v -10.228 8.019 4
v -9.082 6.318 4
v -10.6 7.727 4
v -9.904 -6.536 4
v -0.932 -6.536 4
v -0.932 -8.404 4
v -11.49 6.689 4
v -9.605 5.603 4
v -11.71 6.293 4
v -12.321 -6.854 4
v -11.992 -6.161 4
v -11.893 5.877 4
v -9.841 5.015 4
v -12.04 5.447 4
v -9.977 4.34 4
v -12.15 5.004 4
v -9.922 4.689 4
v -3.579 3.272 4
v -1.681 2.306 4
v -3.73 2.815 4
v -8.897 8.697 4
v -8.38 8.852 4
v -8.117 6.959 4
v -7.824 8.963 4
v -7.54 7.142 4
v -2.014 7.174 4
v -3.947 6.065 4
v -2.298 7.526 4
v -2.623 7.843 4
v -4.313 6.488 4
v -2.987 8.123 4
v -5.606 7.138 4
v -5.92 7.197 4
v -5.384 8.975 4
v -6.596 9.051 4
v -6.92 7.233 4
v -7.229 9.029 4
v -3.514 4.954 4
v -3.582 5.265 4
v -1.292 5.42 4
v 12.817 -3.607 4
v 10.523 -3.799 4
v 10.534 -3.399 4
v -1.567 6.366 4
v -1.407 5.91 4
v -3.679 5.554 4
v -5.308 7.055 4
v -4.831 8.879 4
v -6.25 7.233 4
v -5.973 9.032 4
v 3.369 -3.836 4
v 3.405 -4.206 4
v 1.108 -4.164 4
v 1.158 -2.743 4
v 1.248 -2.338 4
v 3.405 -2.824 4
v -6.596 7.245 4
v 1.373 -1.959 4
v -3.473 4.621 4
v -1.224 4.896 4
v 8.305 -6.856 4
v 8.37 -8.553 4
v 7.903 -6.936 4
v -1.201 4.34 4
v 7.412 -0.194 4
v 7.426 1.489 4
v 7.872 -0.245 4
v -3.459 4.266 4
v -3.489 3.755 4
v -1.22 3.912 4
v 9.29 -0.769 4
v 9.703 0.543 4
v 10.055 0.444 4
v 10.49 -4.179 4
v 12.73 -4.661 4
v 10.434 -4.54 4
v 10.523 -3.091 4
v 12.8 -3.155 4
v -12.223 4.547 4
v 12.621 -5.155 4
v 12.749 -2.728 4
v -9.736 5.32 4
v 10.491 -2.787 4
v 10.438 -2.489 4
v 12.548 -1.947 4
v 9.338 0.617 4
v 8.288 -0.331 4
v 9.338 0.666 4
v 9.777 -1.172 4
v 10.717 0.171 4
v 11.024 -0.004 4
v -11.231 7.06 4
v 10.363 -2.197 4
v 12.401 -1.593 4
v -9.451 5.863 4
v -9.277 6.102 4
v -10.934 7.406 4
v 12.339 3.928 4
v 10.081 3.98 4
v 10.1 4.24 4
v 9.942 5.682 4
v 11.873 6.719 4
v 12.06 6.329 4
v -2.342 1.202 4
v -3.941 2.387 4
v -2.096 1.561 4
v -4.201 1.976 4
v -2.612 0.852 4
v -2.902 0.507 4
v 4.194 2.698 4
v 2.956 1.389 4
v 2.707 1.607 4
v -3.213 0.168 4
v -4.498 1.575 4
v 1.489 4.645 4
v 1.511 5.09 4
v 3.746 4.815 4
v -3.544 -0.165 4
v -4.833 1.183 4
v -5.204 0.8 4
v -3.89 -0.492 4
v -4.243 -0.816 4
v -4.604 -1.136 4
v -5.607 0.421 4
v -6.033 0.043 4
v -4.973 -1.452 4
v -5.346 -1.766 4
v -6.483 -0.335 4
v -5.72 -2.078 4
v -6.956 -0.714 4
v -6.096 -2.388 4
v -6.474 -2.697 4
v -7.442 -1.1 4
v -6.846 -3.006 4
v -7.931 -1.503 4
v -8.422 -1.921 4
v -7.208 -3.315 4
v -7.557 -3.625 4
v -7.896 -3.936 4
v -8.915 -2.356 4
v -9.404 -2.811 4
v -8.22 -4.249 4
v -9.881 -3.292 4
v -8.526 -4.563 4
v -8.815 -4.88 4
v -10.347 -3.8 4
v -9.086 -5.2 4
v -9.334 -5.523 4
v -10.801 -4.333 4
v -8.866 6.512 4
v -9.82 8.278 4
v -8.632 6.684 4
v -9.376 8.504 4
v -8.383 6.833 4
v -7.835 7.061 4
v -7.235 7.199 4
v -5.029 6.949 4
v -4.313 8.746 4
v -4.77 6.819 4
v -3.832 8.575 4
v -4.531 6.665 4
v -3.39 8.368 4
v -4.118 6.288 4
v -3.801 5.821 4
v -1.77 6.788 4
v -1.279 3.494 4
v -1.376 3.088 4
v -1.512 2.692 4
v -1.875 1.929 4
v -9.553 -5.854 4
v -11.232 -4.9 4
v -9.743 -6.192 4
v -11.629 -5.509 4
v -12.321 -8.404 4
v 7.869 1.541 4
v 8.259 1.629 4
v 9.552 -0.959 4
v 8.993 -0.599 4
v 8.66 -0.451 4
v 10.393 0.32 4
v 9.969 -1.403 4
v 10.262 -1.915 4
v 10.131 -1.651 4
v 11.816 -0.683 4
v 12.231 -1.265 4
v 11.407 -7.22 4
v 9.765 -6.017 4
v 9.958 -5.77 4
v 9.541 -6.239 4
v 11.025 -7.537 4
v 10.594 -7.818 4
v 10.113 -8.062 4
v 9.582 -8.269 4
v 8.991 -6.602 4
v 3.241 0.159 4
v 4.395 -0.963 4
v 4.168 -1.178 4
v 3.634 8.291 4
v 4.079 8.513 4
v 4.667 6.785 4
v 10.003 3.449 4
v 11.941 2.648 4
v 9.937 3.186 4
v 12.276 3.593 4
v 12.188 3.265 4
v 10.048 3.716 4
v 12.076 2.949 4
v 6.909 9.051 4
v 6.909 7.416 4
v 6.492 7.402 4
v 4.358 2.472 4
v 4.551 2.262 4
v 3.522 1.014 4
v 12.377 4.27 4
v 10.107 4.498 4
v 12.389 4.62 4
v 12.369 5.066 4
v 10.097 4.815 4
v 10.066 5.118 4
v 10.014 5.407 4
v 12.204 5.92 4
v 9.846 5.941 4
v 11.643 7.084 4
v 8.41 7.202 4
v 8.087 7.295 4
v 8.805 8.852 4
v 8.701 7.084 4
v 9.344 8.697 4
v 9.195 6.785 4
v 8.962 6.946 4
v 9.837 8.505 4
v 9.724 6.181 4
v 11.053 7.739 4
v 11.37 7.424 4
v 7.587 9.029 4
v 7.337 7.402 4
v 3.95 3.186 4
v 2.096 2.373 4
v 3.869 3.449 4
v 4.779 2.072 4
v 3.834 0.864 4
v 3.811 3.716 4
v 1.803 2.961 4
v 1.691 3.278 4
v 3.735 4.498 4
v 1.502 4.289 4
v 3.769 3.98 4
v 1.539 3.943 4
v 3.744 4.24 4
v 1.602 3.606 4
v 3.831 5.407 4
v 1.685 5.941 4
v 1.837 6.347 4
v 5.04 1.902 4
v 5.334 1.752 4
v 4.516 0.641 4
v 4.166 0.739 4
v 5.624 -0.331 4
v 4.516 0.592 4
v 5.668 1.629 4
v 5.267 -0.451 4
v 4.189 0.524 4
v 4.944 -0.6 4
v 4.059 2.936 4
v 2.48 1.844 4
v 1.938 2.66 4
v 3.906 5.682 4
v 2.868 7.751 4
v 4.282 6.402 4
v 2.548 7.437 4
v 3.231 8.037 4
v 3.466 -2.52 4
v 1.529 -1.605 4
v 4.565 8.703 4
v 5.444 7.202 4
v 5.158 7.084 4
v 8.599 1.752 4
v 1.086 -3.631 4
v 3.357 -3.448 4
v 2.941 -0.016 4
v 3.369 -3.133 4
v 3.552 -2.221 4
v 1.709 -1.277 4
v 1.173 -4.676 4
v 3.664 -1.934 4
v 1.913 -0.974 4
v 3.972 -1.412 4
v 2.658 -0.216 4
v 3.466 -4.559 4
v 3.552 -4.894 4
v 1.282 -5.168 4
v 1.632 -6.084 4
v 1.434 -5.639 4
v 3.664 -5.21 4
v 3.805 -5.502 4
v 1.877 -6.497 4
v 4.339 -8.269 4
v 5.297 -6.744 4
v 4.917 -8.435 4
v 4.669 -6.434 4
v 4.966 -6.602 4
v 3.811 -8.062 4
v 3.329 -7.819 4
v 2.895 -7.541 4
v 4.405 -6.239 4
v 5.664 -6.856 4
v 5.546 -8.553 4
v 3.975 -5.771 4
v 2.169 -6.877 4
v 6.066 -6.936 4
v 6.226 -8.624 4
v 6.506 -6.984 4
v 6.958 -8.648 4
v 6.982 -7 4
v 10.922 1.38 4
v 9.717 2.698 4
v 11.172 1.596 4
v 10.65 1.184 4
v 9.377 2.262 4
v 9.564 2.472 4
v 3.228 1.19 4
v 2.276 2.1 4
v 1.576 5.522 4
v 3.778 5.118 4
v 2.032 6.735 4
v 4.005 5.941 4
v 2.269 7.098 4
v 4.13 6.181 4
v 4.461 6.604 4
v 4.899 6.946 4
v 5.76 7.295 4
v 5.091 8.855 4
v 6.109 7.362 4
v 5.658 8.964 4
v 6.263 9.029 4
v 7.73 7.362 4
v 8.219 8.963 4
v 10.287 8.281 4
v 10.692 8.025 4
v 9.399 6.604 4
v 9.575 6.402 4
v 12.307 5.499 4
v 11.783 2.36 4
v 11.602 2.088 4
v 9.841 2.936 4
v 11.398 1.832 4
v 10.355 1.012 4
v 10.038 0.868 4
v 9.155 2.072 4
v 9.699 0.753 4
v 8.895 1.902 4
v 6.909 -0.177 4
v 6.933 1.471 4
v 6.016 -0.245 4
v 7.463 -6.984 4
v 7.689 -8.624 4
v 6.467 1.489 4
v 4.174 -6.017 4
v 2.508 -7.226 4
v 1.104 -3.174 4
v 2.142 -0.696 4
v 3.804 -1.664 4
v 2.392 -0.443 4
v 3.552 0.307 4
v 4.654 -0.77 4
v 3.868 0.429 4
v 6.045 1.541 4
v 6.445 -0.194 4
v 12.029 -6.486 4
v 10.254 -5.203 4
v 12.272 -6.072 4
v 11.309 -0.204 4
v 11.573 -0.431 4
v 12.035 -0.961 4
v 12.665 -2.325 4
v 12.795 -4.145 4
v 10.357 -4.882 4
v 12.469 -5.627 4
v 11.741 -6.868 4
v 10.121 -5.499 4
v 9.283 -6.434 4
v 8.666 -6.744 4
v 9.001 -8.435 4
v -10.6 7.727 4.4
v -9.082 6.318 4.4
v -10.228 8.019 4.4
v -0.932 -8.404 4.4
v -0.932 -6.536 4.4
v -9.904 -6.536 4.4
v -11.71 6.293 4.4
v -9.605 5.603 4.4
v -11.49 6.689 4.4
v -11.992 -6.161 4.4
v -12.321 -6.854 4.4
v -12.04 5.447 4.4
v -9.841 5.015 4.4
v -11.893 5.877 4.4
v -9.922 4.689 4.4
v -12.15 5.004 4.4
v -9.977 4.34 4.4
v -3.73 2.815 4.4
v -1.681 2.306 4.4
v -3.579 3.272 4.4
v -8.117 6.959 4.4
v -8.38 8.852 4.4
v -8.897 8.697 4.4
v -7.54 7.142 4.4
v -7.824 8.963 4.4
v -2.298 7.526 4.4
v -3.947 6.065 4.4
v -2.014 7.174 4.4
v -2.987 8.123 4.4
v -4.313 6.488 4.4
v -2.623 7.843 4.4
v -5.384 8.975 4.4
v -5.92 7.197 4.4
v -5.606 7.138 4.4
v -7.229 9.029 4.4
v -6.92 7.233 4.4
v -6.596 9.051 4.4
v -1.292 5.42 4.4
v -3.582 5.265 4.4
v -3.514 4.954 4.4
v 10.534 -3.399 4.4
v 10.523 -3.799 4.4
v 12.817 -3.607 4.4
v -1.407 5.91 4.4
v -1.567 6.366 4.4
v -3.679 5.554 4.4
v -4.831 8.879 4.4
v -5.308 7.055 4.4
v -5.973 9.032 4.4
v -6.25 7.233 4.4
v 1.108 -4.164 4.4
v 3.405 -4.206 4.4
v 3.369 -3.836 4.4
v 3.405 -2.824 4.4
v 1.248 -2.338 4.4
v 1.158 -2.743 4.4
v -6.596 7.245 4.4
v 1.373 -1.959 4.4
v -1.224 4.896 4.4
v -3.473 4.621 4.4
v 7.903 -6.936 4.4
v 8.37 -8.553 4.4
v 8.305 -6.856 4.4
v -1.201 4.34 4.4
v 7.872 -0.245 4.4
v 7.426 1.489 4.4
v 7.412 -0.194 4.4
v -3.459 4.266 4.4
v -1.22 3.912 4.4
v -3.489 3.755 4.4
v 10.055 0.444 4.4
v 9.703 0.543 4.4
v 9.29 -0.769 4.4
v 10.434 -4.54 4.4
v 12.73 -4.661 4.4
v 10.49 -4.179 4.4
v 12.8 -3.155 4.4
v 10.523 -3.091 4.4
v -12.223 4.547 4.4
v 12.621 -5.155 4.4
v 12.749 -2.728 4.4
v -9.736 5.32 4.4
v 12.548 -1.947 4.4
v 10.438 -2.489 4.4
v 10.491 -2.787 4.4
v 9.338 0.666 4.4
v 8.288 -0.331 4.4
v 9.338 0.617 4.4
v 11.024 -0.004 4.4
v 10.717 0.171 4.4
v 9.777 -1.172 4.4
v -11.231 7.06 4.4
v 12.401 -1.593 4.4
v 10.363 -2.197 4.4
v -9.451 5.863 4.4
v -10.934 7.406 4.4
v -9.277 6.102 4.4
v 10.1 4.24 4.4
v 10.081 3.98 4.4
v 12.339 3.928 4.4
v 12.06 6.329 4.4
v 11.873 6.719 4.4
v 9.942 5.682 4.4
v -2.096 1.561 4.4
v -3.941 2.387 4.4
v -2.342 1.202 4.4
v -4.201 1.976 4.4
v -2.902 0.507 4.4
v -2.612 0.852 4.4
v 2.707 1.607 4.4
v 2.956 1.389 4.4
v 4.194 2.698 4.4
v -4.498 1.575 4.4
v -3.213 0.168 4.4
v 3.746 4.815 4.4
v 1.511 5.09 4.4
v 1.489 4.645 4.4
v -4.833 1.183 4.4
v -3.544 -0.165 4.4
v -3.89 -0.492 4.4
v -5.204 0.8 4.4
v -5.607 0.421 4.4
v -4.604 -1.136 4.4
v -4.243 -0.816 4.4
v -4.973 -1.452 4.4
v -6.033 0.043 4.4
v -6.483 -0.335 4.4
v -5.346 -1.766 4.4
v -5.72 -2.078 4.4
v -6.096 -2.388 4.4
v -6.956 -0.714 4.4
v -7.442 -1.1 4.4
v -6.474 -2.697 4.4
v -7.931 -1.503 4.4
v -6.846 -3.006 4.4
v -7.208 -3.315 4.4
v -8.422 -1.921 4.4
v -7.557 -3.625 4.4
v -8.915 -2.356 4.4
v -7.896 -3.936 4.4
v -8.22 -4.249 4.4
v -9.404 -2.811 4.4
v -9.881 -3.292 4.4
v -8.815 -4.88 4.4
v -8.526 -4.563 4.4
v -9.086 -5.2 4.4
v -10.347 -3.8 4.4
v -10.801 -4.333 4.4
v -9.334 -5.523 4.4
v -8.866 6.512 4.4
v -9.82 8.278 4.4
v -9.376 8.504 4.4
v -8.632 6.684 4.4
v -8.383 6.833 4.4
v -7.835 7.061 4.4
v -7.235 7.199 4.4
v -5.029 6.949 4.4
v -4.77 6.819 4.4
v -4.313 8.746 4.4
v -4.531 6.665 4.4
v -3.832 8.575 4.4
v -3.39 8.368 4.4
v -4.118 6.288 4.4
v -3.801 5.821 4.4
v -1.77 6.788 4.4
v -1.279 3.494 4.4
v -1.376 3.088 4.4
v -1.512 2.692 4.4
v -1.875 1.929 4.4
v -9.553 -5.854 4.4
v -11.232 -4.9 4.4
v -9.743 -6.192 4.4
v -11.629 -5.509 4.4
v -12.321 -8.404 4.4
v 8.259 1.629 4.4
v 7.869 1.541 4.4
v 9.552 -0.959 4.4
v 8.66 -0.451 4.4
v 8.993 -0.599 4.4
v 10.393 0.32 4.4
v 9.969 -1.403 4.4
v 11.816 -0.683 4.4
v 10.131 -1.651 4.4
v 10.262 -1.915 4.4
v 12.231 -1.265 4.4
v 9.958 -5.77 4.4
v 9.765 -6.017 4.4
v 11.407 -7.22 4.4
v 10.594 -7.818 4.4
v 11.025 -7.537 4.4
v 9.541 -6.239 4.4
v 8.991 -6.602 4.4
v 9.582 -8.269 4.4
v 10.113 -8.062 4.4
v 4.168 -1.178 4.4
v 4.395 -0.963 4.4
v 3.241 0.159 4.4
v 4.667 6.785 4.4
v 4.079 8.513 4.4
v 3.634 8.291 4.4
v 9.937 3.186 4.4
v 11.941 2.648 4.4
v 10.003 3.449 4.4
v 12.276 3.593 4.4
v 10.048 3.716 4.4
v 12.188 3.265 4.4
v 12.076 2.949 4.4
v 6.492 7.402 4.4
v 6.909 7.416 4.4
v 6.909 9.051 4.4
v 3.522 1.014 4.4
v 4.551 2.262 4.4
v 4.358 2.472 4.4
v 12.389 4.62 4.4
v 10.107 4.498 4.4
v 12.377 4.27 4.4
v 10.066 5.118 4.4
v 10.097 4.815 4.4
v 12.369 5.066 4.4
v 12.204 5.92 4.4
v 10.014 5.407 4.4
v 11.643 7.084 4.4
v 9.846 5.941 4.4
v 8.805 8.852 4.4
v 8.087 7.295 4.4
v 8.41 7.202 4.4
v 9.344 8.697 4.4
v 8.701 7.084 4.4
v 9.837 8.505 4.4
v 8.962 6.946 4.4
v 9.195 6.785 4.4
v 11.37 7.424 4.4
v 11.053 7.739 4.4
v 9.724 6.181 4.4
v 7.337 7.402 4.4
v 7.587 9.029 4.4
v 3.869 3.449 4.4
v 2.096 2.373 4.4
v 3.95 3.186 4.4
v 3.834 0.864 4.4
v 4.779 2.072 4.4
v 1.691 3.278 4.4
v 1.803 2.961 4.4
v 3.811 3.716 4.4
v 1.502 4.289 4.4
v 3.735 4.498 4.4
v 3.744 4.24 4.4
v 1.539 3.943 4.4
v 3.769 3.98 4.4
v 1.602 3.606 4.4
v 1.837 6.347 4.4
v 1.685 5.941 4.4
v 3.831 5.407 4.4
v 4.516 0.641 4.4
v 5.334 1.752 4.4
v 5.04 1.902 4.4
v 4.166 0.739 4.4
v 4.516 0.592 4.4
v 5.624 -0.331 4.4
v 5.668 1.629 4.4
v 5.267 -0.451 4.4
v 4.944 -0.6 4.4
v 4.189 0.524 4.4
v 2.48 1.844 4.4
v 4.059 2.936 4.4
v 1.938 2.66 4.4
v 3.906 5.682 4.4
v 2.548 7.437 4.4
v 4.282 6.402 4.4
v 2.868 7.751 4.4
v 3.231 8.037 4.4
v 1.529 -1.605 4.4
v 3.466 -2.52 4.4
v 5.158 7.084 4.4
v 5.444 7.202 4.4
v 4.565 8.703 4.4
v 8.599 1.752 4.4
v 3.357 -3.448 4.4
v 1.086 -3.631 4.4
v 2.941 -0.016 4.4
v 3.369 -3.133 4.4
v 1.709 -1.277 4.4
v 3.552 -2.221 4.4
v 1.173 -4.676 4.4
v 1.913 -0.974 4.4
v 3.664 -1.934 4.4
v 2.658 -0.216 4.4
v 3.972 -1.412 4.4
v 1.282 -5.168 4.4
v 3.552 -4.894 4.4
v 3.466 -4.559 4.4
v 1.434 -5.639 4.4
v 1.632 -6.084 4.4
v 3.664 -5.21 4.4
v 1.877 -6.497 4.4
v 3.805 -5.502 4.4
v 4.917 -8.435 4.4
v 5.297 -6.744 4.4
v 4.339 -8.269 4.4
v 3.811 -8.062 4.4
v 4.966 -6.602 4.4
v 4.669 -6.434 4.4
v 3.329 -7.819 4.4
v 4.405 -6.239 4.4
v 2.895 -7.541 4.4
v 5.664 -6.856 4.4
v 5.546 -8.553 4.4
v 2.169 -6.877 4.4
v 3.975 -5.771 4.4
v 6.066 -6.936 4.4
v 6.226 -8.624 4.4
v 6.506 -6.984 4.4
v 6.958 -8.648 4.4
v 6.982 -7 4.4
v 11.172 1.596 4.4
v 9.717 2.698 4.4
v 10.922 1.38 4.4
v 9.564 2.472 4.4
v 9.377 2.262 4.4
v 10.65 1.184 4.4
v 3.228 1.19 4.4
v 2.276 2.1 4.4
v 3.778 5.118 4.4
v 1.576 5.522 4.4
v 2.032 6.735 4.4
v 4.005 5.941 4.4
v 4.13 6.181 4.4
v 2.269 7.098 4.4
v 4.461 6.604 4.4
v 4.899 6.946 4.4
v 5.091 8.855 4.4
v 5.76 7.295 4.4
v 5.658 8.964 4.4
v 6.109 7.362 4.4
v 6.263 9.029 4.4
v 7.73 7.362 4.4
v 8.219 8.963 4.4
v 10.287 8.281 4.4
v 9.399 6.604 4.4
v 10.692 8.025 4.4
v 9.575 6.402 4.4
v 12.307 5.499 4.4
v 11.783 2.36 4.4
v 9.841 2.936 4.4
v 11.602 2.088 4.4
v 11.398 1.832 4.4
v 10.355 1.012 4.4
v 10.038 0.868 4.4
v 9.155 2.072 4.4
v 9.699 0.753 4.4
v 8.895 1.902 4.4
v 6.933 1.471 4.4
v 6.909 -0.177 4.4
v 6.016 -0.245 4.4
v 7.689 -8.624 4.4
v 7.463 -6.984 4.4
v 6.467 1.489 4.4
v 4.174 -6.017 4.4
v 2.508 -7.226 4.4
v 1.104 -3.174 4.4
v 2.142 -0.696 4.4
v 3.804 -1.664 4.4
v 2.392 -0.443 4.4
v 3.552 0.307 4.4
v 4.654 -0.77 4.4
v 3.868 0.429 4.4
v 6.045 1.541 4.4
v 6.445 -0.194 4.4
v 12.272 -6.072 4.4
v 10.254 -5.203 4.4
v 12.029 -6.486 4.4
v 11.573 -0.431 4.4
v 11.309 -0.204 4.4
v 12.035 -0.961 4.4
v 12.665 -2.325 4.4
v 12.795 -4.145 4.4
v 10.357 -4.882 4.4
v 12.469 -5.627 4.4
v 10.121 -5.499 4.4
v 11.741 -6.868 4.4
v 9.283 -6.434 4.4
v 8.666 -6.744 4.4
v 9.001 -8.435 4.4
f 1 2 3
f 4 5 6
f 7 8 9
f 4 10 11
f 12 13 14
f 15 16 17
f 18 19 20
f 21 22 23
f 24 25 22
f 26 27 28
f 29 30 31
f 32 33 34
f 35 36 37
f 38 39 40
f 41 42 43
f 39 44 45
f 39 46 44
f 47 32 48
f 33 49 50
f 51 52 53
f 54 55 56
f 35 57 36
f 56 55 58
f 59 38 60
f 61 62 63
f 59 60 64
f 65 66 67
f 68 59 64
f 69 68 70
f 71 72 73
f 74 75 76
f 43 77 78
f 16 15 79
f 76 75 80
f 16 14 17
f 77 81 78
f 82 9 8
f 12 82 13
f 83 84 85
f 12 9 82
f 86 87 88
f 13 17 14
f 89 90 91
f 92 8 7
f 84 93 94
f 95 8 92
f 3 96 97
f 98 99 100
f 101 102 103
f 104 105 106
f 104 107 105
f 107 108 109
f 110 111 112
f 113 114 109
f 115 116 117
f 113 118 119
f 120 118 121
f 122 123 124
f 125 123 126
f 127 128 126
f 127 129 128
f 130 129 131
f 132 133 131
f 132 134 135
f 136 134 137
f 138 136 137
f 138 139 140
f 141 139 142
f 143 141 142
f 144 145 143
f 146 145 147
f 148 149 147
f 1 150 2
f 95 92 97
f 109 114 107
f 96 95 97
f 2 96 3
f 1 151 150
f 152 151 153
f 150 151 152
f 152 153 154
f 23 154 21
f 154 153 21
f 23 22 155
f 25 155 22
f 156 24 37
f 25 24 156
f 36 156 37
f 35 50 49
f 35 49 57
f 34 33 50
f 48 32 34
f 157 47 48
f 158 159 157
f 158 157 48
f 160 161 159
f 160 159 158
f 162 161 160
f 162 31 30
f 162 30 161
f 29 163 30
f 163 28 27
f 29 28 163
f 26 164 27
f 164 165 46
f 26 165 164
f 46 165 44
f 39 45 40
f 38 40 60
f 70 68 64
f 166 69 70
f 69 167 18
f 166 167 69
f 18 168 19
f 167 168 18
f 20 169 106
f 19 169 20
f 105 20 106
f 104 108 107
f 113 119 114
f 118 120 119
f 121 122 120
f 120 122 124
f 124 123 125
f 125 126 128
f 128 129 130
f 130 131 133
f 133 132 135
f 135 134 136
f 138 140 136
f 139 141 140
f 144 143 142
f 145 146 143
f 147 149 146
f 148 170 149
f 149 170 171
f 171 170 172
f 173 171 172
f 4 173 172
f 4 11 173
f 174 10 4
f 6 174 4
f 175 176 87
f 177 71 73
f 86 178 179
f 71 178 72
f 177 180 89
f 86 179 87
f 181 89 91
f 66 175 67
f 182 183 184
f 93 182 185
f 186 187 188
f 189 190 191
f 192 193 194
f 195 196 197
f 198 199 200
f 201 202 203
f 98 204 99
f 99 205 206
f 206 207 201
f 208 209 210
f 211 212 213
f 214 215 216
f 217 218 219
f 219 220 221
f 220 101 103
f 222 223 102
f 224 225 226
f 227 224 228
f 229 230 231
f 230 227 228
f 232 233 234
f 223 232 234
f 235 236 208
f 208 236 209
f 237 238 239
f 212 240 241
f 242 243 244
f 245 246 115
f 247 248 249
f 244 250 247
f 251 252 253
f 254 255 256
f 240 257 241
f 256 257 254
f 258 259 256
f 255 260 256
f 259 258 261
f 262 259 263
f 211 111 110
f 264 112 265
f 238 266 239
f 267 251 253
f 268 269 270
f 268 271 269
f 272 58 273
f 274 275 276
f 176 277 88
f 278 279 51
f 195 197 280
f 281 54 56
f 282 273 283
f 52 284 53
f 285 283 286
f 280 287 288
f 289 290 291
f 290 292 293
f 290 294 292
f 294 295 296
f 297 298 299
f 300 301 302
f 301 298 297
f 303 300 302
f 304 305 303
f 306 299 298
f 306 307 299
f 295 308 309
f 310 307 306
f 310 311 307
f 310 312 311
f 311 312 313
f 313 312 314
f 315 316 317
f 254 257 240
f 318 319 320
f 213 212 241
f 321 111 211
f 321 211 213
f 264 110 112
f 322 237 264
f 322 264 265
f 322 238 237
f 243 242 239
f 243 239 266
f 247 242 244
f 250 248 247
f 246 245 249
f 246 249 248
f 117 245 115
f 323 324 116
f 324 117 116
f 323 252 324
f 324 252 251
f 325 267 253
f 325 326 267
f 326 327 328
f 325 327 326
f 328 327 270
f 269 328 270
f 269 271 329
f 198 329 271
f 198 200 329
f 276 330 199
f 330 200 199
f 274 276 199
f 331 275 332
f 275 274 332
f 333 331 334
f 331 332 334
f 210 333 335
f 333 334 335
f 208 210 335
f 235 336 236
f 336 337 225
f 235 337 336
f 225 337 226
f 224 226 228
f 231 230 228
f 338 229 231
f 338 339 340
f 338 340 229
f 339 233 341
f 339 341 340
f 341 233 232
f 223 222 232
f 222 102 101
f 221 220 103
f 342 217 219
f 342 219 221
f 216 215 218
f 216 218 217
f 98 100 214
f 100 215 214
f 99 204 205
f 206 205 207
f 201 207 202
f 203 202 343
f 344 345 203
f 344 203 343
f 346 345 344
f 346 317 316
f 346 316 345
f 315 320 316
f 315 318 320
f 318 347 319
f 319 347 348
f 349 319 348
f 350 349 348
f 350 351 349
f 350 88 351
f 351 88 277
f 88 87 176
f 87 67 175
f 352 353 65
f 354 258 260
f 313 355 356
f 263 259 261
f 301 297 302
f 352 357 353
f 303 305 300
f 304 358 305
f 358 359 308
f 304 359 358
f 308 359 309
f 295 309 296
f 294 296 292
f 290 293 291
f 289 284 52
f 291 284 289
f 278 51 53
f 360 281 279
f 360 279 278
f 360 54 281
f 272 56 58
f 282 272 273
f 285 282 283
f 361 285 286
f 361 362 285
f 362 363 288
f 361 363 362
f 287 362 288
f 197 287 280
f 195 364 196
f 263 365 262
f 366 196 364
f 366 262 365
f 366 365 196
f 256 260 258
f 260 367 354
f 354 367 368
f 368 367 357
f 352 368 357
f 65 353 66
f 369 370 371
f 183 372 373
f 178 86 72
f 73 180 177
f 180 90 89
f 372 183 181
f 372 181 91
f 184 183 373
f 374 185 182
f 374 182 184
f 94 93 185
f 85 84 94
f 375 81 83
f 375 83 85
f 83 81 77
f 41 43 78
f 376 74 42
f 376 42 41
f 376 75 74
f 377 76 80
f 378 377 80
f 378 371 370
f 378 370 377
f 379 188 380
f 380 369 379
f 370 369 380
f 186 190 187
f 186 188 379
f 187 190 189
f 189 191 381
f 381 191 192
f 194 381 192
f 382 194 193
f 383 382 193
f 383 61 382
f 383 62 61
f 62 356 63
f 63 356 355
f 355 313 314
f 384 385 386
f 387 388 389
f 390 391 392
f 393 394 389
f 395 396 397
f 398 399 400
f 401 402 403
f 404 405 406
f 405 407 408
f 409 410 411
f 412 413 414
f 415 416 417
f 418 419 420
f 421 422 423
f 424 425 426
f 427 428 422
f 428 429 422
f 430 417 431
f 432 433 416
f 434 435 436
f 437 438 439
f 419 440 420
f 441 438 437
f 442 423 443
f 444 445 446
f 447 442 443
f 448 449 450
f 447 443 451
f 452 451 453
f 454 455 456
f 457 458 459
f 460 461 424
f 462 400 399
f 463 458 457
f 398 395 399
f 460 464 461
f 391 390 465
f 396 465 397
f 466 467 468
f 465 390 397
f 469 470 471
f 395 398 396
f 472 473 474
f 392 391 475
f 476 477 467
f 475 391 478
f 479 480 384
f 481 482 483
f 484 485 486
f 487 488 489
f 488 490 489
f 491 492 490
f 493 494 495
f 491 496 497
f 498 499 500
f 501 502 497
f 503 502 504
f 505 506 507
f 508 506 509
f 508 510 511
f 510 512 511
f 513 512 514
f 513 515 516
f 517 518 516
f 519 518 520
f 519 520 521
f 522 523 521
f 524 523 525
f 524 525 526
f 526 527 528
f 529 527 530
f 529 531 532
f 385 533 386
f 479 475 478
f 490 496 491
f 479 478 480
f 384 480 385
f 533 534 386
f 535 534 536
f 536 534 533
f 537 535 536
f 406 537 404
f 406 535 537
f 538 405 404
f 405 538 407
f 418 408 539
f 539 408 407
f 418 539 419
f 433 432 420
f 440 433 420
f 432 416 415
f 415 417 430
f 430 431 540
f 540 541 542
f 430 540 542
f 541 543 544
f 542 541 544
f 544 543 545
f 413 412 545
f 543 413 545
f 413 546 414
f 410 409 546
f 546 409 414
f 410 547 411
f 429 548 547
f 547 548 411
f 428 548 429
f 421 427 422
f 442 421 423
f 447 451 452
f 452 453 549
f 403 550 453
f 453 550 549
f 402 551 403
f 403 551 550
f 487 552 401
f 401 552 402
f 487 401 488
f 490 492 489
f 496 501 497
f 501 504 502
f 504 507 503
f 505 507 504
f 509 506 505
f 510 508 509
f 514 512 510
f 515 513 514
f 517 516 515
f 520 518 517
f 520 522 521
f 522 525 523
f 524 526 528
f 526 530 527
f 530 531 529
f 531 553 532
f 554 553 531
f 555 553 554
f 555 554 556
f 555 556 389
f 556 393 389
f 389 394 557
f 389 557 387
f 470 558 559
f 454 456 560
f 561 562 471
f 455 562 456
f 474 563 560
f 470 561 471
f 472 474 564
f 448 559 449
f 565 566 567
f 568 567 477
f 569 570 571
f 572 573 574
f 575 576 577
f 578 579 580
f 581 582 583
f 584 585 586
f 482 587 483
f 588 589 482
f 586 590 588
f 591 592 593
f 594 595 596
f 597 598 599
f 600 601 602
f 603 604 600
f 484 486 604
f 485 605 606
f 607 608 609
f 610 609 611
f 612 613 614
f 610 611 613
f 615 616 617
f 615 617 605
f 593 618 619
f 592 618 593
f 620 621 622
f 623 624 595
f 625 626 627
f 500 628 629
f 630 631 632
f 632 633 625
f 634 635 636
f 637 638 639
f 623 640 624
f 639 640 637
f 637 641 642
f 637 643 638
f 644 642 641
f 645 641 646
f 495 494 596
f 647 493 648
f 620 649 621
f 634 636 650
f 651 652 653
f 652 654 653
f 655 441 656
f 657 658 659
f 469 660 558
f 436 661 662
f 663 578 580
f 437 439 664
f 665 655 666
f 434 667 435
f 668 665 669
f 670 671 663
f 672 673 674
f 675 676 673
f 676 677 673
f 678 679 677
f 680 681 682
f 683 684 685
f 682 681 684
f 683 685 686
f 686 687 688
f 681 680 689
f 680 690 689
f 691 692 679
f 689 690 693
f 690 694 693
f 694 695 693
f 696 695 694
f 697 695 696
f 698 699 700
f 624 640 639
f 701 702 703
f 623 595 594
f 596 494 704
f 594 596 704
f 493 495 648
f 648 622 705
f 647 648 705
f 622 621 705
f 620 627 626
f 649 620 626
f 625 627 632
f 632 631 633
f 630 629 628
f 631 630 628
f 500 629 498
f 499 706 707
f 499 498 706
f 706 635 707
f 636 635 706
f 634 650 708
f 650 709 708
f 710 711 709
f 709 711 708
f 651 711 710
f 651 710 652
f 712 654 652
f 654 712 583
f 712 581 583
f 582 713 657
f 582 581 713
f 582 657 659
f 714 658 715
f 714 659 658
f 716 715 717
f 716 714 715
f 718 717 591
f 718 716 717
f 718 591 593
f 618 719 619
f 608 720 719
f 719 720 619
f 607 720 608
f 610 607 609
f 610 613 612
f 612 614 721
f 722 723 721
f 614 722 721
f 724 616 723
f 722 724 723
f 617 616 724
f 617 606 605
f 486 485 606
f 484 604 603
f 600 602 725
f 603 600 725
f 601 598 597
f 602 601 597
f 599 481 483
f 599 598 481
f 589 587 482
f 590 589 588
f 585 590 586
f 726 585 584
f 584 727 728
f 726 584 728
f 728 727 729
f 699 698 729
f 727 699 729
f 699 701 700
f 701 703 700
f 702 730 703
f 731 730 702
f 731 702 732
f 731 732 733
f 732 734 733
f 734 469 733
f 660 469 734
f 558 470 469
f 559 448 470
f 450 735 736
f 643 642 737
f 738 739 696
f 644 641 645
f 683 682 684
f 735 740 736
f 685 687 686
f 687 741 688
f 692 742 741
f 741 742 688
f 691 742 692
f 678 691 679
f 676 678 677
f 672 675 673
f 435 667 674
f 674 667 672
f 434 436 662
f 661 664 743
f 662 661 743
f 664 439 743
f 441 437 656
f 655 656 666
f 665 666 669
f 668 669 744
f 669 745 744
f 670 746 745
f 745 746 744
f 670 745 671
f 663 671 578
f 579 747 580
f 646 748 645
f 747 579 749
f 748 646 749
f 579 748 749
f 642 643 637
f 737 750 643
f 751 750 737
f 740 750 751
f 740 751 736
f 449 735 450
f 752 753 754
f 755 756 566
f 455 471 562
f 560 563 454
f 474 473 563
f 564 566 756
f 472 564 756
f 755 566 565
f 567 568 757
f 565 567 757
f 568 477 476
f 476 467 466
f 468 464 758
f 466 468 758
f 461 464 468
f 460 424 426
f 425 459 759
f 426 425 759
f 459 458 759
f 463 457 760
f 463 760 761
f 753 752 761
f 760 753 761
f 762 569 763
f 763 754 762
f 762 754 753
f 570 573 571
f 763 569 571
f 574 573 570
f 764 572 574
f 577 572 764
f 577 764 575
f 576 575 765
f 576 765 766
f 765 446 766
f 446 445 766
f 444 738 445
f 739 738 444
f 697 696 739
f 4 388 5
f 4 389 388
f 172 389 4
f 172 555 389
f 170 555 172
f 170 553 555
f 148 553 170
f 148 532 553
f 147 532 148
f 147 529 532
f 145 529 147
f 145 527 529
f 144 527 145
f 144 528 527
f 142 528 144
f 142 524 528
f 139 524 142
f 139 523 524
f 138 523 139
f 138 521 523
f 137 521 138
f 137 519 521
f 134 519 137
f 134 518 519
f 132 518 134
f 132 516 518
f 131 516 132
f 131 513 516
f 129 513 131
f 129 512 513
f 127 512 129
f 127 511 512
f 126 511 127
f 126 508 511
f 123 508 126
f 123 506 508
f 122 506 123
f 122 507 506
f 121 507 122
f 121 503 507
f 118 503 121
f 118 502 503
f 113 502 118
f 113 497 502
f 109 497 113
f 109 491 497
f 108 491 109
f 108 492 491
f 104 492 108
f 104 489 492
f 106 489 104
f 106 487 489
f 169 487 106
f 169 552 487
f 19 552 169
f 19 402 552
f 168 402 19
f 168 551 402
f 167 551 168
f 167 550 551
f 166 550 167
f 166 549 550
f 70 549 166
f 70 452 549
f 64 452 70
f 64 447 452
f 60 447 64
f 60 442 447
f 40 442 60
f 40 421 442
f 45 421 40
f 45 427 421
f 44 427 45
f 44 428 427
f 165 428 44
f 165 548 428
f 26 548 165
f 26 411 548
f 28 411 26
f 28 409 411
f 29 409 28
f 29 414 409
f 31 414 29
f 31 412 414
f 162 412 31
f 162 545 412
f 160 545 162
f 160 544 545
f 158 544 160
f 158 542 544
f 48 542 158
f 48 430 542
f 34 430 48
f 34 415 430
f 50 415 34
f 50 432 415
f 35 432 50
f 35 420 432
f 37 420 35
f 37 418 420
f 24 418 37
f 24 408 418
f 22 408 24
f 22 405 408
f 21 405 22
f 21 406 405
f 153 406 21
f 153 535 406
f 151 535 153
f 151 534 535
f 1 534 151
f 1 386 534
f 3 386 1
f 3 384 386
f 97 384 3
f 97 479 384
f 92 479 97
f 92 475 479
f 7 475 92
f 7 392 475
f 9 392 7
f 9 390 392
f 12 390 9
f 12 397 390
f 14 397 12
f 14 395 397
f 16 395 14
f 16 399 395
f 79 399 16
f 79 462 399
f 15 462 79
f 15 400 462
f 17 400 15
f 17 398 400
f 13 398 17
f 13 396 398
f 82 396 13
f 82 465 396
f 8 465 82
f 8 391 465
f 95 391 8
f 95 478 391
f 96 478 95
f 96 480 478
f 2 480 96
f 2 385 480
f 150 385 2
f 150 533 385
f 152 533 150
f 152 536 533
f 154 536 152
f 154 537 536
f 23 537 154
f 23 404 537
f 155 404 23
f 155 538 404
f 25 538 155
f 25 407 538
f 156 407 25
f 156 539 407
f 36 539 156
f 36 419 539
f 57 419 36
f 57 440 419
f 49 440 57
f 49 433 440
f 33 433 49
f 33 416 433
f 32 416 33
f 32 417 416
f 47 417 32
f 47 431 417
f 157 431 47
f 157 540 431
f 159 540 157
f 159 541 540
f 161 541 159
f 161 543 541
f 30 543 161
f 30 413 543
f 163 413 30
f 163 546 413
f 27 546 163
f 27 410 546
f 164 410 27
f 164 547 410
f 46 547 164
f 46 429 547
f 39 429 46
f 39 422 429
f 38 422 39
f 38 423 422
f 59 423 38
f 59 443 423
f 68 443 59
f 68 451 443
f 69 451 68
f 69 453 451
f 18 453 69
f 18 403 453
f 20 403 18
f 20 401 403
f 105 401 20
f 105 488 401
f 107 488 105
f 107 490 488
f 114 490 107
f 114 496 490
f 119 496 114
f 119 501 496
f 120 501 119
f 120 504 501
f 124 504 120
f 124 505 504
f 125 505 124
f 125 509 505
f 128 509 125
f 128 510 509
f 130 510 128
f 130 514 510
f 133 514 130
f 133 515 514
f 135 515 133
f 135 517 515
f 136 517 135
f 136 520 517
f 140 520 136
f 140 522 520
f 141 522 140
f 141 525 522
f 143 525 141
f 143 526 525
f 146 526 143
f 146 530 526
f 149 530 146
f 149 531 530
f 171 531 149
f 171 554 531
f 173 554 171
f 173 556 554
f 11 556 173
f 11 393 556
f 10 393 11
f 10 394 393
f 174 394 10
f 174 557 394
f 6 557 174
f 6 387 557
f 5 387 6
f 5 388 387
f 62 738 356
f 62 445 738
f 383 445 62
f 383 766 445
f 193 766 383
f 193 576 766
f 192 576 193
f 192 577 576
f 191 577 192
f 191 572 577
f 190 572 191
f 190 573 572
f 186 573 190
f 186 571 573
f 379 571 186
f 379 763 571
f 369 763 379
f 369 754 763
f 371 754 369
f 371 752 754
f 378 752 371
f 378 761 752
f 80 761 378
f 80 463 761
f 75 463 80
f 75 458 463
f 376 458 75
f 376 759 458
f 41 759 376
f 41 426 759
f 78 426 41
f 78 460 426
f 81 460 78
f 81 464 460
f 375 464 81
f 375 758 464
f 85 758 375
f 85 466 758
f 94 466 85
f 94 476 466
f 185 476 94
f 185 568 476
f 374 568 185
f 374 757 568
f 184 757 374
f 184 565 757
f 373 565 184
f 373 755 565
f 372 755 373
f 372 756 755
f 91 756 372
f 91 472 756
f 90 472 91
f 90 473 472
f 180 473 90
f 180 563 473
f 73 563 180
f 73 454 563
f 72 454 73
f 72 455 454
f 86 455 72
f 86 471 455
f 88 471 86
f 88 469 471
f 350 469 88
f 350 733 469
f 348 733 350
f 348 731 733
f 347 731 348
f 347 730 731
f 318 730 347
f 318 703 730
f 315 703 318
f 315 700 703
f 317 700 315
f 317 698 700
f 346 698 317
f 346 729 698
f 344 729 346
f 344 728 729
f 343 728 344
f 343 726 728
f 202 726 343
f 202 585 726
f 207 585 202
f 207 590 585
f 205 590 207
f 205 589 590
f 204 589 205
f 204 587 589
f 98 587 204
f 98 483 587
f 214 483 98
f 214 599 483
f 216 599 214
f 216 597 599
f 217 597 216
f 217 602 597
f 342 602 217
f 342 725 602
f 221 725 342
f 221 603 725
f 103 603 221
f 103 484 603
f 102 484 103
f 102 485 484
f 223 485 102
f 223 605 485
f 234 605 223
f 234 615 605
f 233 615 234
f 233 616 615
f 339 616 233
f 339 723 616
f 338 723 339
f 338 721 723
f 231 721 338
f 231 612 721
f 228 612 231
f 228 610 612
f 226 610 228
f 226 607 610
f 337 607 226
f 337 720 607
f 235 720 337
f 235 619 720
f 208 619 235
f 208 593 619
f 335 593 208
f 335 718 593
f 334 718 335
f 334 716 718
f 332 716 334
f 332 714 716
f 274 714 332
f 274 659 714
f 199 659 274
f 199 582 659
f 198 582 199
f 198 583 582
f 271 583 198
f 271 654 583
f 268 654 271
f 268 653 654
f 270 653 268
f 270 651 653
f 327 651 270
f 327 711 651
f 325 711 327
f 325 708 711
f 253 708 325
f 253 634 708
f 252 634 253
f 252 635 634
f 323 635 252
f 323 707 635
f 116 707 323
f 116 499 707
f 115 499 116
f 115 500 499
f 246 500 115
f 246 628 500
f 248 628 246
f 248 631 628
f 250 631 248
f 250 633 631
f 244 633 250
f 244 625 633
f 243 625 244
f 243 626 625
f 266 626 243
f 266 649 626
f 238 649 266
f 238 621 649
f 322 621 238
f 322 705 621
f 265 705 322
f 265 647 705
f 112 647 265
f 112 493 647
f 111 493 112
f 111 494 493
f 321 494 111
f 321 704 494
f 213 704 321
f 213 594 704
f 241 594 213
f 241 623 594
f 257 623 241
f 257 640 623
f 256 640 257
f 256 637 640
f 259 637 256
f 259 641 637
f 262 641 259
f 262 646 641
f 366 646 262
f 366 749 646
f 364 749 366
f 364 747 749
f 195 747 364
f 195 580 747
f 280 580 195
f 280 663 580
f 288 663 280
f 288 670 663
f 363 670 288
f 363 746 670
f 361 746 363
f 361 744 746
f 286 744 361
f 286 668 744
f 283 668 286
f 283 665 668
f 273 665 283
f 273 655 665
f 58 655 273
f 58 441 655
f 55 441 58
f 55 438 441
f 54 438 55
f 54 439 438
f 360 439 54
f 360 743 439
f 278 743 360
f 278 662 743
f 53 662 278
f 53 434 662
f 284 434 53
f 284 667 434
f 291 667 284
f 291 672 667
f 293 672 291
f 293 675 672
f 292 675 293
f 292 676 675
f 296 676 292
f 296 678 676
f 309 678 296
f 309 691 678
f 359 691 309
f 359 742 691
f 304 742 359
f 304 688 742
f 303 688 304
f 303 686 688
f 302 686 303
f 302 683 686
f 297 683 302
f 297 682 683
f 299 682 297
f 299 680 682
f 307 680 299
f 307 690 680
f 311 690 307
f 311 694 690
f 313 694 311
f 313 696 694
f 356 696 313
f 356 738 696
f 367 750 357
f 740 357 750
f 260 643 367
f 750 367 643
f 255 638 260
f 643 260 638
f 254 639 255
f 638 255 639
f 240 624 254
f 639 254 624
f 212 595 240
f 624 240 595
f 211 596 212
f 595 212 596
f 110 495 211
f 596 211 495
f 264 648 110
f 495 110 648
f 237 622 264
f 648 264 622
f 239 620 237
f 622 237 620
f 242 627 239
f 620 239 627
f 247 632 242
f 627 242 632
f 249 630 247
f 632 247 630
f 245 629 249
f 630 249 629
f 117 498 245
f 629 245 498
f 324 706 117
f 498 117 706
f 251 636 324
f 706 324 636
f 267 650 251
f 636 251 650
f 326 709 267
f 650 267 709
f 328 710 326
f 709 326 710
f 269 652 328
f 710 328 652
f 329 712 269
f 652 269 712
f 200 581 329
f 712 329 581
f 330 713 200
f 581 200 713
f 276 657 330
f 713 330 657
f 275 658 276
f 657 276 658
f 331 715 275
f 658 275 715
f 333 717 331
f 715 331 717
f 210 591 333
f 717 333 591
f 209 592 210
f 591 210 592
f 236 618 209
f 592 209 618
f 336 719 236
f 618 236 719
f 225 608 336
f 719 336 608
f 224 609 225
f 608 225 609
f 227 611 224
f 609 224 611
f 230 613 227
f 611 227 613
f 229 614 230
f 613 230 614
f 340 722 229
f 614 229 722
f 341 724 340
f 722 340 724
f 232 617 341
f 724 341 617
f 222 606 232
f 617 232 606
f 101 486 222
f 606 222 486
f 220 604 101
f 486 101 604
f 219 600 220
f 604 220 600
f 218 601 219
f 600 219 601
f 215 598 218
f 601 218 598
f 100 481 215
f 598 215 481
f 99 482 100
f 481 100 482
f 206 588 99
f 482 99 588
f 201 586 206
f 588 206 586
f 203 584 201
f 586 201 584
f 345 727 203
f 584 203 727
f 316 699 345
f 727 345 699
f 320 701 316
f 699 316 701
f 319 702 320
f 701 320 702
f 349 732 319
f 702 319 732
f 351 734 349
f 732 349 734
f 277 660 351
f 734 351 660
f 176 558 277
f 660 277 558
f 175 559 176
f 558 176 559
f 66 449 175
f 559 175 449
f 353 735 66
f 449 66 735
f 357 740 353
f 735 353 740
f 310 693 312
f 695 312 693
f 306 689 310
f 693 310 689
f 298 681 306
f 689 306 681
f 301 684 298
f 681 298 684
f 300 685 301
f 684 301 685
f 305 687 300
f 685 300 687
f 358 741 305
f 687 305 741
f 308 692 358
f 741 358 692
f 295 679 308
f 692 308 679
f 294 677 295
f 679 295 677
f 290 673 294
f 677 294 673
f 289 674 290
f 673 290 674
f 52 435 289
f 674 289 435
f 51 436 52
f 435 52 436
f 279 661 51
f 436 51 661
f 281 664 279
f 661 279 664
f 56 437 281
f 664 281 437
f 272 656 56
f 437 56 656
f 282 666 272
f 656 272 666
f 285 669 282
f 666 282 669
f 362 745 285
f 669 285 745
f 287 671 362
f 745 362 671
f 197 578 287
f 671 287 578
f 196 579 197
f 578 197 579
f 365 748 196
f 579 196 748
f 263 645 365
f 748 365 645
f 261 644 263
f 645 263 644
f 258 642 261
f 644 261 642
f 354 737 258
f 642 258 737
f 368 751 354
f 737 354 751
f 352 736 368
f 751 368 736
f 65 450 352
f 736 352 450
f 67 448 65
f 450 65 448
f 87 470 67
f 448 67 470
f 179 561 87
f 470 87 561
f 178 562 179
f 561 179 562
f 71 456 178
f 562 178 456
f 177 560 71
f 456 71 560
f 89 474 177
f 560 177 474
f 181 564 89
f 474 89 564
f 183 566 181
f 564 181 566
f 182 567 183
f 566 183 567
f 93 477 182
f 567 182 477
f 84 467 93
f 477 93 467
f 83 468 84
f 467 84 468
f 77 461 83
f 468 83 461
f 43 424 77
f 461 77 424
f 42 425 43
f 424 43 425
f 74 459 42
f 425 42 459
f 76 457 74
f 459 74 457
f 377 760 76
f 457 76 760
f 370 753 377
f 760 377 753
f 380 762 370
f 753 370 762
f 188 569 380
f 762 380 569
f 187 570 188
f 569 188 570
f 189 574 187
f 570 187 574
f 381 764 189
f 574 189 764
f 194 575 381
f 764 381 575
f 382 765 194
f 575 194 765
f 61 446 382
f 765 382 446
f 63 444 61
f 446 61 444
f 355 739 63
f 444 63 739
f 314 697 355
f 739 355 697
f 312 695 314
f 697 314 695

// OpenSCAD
// file: ../utils/colorstl.scad
module colorpart(clr) {
  color(colors[clr])
  if (clr==current_color || current_color==-1) {
    children();
  }
  else {
  }
}
// main file
inch = 25.4;
colors=["yellow", "black"];

// changes to 0 to export the text
// change to 1 to export the card
current_color = 0;

include <../utils/colorstl.scad>

broach_r = 1 * inch;
broach_h = 4;
broach_sides = 8;

hole_r = 2;
hole_h = broach_h * 1.1;

colorpart(1) { 
    difference() {
        cylinder(h = broach_h, r = broach_r, $fn = broach_sides);
        translate([0, (broach_r * .8), -.1]) {
            cylinder(h = hole_h, r = hole_r, $fn = 120);
        }
    }
}

colorpart(0) {
    translate([0, 0, broach_h]) {
        linear_extrude(height=0.4) {
           text("28", size=18, halign="center", valign="center");
        }
    }   
}
